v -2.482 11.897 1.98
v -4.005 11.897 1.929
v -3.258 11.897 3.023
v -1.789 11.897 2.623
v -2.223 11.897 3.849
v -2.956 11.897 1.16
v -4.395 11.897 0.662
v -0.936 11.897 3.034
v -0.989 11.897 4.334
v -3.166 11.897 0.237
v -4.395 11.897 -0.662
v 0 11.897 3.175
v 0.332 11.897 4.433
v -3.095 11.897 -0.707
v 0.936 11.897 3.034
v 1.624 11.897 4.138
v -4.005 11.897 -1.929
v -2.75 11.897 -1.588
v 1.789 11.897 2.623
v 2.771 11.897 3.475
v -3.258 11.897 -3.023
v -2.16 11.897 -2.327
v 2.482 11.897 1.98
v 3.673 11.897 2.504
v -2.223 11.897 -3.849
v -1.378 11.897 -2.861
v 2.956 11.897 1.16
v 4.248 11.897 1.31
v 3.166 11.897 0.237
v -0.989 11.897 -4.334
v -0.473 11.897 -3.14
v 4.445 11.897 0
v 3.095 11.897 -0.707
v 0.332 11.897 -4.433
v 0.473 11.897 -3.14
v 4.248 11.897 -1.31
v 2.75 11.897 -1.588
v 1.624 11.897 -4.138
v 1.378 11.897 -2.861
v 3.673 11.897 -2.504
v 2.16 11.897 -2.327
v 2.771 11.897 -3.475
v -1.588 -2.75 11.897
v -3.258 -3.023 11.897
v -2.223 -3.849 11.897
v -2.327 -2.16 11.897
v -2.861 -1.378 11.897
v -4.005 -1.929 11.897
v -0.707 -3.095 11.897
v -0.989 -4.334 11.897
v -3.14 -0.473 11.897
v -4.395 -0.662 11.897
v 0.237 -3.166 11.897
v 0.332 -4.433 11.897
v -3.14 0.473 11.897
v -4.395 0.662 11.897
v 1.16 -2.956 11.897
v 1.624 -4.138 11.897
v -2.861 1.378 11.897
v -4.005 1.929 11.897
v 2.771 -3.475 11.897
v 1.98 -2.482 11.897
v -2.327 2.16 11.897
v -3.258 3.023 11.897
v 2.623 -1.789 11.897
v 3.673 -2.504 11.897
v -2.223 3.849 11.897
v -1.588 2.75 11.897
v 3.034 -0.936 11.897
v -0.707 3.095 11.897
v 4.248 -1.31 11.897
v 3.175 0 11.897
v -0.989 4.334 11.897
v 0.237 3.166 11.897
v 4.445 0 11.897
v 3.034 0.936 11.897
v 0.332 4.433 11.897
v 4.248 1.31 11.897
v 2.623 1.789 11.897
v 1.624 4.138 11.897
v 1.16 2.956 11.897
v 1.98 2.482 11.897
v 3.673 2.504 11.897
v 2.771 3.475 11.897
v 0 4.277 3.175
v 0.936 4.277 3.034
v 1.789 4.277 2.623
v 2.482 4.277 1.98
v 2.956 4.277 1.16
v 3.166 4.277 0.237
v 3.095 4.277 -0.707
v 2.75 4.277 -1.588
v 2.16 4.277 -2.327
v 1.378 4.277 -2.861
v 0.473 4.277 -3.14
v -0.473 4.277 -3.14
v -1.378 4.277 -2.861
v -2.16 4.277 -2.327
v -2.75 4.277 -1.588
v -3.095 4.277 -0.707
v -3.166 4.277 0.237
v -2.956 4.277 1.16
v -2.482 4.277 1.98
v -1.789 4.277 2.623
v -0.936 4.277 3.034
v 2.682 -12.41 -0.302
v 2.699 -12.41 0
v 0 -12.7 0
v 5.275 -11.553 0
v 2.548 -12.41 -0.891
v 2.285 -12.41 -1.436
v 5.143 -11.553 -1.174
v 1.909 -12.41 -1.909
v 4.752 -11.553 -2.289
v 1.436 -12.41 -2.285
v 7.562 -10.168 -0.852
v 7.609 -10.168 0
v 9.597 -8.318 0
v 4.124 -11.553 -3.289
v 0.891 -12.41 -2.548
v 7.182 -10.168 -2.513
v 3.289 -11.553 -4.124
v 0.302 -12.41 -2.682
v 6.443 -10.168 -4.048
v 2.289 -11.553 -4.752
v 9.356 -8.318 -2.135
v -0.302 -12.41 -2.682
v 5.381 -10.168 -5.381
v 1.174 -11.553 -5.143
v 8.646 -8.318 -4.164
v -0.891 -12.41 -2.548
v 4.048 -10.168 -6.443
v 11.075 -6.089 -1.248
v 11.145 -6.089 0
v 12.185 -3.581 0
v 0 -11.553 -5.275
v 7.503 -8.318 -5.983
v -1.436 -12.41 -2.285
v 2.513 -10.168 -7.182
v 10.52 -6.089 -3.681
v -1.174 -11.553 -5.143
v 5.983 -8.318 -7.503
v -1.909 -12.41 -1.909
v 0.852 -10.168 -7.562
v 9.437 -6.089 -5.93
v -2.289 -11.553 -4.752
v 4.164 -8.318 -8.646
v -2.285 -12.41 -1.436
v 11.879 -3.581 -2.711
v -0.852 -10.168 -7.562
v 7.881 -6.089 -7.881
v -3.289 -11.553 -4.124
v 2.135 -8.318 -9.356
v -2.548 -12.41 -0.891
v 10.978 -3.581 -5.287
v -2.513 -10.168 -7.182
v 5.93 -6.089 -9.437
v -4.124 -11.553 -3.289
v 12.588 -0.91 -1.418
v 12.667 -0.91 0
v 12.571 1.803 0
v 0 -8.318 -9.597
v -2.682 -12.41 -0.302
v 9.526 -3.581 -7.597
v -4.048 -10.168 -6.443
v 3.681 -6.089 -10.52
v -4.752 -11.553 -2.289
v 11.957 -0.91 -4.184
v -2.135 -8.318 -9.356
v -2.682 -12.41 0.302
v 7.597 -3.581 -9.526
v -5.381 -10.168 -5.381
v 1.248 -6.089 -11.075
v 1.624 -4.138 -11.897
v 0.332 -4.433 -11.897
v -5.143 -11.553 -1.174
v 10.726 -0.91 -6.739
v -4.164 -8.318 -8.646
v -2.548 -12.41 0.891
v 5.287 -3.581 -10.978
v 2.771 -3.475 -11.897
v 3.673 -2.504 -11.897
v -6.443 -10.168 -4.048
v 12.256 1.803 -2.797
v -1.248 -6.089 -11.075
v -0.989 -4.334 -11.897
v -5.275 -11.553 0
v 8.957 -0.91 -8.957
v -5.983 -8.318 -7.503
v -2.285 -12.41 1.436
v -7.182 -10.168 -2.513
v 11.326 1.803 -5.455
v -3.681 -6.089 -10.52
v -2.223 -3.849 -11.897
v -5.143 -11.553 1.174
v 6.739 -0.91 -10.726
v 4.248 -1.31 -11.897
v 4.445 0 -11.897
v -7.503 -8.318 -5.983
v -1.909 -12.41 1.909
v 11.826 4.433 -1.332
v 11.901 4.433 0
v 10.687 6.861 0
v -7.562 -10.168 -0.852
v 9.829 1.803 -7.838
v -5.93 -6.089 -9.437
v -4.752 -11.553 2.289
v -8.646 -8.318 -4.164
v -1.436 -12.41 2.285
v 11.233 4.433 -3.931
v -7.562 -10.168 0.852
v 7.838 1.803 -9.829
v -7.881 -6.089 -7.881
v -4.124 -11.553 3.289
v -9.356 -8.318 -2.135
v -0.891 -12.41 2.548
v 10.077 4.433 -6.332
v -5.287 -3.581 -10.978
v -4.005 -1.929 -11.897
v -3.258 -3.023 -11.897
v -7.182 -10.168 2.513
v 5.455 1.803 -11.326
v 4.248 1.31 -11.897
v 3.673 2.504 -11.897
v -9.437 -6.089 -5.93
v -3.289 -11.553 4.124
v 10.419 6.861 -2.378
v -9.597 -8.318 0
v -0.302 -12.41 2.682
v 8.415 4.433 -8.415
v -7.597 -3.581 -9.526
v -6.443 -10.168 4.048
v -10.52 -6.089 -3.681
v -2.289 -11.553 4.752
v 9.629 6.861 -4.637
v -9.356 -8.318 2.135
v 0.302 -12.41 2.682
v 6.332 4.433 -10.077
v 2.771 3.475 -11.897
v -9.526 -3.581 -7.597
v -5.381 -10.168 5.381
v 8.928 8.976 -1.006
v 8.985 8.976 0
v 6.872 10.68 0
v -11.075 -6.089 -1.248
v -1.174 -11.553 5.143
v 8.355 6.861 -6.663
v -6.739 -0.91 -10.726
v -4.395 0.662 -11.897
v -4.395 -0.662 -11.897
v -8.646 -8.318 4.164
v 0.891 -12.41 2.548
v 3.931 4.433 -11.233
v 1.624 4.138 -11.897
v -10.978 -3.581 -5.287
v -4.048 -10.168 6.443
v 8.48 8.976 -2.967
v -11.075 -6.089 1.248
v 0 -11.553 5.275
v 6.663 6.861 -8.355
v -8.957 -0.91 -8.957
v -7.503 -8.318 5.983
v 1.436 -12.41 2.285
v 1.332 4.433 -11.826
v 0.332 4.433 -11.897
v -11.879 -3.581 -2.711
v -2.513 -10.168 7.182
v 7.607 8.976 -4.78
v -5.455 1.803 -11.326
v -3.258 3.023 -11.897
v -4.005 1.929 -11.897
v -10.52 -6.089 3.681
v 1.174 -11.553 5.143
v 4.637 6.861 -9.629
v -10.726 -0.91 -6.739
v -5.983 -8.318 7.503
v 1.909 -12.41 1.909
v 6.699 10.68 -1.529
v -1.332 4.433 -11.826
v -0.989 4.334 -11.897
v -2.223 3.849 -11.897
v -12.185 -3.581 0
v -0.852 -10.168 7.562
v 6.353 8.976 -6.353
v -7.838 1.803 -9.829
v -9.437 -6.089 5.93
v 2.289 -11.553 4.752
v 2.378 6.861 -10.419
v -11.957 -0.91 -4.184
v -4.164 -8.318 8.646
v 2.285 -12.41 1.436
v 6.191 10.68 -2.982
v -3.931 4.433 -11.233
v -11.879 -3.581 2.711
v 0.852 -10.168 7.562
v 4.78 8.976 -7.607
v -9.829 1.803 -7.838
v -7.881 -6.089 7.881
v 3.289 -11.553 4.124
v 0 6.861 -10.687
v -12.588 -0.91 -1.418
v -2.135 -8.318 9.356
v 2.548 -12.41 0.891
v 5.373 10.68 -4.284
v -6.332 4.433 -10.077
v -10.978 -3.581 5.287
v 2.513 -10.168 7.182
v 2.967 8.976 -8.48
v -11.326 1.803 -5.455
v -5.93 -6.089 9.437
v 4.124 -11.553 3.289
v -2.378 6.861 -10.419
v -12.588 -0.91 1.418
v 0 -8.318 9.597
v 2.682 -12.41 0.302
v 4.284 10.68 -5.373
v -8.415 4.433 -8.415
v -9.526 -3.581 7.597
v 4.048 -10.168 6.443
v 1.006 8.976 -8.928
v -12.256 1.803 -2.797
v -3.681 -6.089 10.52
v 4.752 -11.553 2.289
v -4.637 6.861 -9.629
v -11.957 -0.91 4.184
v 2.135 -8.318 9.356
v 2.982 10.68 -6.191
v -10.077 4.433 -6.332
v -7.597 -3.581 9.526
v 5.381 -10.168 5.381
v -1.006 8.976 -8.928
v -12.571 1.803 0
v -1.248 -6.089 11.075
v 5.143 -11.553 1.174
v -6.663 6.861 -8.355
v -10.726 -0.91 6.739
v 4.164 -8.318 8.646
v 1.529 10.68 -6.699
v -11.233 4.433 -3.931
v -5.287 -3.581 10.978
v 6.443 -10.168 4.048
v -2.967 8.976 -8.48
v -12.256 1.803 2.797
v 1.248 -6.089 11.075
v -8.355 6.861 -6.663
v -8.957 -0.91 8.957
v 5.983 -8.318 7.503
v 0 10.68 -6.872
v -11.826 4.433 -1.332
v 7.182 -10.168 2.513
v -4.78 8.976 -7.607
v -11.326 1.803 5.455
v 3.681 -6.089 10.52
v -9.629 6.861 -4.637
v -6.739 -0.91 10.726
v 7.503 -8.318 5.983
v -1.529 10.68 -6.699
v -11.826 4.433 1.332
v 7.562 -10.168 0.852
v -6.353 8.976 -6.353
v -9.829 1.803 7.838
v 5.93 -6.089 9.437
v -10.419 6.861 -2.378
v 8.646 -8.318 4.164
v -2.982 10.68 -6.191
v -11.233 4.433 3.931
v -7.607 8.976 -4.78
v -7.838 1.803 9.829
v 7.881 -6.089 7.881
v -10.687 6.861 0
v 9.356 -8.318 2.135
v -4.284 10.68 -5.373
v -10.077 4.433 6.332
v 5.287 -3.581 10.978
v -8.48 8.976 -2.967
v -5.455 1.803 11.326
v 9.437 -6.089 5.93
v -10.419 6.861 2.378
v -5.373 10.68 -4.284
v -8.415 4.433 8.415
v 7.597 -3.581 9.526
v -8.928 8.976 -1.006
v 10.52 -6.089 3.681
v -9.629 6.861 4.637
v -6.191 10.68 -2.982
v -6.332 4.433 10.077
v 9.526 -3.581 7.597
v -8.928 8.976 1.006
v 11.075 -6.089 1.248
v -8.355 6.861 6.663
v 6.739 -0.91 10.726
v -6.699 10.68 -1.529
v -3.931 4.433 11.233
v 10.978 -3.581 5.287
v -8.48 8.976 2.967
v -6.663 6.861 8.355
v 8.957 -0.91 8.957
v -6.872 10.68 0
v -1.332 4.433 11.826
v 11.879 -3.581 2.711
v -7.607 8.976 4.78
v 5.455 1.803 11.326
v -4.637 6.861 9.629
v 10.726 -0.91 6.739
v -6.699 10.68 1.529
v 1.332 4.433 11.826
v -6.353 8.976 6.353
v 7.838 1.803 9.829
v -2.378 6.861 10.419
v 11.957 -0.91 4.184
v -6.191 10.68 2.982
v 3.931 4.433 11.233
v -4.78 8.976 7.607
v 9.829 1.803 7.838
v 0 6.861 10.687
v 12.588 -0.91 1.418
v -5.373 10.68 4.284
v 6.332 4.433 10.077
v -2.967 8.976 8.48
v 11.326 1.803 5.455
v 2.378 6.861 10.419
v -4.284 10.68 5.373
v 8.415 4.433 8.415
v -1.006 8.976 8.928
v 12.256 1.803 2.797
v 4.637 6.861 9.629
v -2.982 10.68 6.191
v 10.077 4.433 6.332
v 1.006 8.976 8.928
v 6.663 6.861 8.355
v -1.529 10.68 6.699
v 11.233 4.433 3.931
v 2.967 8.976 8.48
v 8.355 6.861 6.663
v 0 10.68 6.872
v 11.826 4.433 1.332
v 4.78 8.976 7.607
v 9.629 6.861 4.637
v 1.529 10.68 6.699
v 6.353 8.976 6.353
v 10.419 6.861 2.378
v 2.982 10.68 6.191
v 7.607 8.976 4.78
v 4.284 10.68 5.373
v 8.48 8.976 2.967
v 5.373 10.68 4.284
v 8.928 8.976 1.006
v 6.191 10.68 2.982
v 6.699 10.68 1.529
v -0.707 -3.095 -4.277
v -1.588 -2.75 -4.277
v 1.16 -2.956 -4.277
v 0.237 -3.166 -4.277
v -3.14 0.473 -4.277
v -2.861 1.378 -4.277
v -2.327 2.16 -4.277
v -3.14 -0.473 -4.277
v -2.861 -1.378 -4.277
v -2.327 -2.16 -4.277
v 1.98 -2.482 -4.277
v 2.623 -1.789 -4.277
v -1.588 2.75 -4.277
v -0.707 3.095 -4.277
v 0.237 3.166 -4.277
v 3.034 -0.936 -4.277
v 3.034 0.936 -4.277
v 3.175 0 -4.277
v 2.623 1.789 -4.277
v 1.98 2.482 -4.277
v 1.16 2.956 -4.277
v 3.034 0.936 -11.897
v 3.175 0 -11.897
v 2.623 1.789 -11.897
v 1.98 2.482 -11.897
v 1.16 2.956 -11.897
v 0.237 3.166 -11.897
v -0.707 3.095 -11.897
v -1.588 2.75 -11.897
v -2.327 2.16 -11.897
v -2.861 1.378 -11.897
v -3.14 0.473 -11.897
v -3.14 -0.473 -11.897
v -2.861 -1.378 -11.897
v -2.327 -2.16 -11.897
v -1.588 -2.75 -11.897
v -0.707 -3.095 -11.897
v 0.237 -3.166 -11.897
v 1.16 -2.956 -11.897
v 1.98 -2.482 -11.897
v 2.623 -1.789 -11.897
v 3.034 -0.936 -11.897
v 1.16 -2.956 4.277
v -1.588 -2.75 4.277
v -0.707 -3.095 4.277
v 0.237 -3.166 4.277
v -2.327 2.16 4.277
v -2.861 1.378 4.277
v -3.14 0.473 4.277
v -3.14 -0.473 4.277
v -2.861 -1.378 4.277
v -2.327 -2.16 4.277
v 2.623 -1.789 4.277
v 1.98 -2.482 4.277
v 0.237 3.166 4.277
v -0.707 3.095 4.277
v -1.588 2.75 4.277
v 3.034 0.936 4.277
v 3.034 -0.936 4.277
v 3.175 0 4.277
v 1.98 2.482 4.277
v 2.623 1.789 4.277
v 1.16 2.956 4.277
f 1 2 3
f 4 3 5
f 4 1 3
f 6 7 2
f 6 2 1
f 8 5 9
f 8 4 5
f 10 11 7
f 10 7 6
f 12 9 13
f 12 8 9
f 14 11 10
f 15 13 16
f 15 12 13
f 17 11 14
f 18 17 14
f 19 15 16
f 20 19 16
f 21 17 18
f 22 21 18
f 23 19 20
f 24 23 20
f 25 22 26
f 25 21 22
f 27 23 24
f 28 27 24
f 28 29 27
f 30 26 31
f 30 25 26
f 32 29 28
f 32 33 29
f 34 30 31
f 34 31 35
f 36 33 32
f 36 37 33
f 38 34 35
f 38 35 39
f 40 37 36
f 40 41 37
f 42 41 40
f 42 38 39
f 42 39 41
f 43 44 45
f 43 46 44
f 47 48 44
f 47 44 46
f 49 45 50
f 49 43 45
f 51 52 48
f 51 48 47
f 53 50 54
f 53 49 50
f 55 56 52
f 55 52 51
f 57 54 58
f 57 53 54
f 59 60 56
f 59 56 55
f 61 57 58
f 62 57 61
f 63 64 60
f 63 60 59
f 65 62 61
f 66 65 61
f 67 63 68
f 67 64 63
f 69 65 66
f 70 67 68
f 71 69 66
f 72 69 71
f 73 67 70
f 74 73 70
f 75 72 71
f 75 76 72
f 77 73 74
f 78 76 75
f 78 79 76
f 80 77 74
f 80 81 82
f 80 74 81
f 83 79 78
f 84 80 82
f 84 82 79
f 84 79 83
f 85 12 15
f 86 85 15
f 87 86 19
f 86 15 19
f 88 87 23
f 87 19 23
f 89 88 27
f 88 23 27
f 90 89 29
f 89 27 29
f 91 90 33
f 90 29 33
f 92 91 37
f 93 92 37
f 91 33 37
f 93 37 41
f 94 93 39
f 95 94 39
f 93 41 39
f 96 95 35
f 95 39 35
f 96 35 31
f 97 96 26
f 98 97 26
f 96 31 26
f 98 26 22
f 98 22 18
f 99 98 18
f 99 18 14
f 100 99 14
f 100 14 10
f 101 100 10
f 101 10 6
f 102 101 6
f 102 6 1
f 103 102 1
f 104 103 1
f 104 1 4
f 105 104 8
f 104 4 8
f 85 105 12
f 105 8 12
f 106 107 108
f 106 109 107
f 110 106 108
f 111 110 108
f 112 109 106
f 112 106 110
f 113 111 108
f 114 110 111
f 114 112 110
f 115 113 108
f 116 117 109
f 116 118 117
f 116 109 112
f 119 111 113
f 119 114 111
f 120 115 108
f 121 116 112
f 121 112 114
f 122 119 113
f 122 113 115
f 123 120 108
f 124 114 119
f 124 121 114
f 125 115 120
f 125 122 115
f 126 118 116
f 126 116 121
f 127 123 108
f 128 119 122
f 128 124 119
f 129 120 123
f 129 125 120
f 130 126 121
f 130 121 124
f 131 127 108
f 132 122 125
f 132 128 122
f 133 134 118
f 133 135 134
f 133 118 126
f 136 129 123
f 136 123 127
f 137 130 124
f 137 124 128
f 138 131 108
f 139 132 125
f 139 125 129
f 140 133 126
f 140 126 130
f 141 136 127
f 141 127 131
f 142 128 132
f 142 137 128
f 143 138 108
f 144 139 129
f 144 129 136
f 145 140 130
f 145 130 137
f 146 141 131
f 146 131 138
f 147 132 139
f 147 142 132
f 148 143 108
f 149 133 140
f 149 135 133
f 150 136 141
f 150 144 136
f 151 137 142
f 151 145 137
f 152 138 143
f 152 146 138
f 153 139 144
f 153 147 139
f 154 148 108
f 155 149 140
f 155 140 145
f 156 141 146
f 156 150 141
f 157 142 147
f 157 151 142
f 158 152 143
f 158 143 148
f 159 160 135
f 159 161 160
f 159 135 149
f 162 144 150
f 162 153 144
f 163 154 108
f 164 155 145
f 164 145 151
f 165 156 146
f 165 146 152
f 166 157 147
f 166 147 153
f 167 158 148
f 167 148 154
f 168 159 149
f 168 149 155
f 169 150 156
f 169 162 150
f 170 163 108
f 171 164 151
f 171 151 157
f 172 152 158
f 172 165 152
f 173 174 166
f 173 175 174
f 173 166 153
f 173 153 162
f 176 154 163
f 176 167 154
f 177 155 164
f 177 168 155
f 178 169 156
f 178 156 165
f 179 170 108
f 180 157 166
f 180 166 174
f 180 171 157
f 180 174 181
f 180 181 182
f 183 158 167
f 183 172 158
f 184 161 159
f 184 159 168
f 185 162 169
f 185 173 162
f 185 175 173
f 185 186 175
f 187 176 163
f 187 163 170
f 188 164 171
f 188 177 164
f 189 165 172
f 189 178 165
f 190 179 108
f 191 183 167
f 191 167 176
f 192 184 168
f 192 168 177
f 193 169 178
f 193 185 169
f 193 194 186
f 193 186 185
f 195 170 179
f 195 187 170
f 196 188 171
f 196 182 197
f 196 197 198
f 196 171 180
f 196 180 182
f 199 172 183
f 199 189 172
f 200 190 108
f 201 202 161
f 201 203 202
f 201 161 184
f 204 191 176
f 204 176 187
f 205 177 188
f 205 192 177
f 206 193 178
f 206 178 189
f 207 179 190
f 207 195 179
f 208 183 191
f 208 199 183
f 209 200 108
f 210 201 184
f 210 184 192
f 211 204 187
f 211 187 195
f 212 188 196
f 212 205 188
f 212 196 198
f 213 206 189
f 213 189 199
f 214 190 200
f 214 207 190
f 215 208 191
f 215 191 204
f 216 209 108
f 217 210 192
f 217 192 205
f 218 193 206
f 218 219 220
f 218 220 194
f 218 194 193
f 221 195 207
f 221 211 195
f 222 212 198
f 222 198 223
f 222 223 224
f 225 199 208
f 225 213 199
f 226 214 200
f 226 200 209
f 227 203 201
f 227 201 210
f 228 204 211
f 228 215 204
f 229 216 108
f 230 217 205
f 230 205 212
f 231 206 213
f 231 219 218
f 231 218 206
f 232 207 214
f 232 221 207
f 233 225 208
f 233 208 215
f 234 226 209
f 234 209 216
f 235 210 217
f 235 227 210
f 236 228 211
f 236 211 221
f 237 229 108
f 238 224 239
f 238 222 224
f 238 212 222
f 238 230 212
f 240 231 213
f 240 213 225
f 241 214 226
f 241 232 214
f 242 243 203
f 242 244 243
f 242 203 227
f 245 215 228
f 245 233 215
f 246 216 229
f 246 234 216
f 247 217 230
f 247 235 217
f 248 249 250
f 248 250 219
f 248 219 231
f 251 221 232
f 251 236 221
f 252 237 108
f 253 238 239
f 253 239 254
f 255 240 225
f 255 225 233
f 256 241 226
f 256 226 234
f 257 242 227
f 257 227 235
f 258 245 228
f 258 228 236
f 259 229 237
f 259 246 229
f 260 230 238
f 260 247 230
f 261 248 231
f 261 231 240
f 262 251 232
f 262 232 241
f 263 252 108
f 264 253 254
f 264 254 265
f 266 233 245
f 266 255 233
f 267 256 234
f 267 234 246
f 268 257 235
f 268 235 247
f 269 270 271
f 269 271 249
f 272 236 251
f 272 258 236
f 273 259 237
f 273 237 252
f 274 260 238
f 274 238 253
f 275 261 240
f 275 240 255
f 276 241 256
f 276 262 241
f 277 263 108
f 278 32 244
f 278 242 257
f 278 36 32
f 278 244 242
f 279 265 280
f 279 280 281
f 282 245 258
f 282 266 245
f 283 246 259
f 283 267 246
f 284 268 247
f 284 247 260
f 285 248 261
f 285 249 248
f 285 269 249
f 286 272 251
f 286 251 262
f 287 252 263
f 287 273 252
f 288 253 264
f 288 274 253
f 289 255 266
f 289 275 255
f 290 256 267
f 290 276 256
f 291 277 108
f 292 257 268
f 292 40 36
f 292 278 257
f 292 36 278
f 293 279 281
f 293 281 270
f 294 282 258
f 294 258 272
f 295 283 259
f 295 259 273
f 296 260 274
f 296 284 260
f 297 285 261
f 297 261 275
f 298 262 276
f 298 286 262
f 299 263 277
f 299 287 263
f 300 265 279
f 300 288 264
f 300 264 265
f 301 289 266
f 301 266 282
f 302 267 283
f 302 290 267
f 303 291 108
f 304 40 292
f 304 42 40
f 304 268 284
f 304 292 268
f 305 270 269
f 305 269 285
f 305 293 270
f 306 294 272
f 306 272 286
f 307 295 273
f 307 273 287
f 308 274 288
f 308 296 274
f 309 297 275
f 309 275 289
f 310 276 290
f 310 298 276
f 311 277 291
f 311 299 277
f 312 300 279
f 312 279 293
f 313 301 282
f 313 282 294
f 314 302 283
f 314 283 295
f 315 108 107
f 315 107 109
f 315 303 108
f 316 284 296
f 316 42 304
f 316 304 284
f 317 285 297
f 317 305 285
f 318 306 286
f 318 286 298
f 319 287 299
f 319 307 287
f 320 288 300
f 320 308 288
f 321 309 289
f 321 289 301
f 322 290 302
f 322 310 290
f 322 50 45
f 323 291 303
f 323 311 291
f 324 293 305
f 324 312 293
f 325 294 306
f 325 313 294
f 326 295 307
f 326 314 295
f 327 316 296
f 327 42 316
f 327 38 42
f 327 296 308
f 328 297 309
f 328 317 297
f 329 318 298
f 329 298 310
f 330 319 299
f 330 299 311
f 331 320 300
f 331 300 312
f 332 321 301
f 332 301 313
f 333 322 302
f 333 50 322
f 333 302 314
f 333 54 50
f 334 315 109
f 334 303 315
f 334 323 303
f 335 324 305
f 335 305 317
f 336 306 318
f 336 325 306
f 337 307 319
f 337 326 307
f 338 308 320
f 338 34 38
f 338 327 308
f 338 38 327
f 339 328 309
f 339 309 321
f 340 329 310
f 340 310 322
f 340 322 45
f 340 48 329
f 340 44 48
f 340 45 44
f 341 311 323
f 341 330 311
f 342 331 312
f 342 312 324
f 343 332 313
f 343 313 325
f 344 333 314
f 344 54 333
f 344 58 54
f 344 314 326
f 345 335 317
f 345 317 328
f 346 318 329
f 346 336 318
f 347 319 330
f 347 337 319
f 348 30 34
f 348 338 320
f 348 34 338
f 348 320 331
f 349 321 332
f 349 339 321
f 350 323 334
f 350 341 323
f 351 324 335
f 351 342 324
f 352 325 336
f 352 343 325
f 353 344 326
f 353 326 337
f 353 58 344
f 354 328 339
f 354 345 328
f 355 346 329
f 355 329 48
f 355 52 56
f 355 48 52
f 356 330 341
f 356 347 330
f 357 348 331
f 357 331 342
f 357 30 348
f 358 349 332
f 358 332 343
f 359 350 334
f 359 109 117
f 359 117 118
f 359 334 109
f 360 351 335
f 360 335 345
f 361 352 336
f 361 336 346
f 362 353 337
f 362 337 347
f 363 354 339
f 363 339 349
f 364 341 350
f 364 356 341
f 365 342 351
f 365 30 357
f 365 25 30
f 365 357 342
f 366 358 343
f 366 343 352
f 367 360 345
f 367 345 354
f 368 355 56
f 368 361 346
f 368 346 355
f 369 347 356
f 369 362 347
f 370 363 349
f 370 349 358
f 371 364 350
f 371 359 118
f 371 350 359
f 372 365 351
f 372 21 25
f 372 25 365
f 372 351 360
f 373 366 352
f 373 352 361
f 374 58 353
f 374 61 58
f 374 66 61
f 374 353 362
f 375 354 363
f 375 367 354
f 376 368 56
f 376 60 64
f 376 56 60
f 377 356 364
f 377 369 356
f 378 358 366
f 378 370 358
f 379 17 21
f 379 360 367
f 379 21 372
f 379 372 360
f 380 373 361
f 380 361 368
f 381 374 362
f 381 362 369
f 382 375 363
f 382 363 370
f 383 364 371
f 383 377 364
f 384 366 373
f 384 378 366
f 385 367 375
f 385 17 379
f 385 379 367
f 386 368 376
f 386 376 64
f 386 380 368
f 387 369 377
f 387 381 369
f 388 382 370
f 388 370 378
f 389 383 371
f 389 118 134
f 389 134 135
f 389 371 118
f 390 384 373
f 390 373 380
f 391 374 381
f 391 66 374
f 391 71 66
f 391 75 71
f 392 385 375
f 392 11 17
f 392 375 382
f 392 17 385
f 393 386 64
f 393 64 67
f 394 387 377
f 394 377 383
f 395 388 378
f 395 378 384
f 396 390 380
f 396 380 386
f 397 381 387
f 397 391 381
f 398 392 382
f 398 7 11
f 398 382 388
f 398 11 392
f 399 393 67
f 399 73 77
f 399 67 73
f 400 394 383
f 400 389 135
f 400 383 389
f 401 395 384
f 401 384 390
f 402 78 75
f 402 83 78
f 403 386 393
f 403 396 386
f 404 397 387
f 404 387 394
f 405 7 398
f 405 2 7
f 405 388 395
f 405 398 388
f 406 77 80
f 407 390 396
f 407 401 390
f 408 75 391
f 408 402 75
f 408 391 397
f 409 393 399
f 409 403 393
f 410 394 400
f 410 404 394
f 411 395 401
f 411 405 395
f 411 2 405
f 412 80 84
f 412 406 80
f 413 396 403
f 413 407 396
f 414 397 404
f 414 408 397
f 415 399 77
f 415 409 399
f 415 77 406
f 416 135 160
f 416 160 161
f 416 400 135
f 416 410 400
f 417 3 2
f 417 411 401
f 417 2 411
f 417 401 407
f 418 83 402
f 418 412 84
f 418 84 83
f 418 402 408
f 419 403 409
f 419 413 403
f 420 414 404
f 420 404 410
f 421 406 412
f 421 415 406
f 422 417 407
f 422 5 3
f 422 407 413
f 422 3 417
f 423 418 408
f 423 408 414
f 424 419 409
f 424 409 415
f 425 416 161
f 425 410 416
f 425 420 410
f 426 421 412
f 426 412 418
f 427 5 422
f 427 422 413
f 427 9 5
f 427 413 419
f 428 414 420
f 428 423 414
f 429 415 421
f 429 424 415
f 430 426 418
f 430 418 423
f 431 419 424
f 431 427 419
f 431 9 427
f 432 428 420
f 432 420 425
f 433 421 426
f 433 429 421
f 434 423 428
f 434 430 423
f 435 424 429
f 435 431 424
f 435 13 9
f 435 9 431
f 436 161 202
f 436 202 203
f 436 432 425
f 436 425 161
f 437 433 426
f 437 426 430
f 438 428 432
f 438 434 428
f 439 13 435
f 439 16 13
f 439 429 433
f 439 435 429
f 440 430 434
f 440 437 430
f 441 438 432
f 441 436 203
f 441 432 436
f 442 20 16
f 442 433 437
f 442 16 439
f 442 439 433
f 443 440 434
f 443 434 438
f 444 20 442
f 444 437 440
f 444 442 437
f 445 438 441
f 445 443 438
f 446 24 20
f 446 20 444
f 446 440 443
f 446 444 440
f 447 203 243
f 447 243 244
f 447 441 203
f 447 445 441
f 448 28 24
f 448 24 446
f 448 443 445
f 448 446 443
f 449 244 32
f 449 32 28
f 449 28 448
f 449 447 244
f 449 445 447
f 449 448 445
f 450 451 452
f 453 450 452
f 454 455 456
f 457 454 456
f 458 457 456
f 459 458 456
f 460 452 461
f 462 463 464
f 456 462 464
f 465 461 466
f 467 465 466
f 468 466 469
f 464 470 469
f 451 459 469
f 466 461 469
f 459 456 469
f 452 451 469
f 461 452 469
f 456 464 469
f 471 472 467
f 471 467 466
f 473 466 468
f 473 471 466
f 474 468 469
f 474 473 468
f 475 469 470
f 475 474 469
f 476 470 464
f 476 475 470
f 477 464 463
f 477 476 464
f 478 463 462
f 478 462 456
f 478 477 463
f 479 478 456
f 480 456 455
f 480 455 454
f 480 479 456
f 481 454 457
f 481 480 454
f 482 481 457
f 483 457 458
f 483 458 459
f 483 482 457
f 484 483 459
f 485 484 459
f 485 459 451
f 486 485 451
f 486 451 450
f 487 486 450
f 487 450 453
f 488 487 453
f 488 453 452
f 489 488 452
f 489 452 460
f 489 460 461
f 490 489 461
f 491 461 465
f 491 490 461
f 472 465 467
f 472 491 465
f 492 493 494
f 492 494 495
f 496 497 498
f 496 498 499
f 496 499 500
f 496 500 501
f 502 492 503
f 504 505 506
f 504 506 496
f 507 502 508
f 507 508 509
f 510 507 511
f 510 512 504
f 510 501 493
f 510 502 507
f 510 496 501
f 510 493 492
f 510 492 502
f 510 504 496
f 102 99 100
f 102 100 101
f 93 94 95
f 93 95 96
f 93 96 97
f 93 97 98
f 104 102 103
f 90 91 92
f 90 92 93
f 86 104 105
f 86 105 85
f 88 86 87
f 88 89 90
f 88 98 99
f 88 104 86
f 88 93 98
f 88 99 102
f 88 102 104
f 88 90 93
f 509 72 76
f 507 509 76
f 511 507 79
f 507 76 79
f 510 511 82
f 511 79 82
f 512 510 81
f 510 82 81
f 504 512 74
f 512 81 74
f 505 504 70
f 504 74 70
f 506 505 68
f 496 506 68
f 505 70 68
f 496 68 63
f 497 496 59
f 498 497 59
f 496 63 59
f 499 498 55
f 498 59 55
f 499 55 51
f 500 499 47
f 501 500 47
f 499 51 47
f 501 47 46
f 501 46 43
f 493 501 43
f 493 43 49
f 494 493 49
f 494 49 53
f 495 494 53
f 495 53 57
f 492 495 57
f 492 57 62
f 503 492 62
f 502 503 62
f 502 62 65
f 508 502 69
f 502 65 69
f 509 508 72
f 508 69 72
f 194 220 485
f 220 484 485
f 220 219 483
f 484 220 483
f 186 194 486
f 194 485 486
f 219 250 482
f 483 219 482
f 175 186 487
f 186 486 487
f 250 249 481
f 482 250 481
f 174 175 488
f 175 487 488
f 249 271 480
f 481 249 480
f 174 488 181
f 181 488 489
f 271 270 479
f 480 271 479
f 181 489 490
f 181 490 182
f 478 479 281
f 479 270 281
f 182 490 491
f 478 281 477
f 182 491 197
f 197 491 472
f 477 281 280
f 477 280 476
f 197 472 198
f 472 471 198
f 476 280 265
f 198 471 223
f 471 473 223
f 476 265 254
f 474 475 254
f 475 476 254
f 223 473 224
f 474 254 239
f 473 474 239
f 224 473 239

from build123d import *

# Parameters (mm, degrees)
CUT_EXTRUDE1_START = 11.896721
SKETCH3_R          = 4.445
CUT_EXTRUDE1_DEPTH = 2.54
SKETCH4_R          = 3.175
CUT_EXTRUDE2_DEPTH = 7.62
CUT_EXTRUDE3_START = 11.896721
SKETCH5_R          = 4.445
CUT_EXTRUDE3_DEPTH = 7.62
SKETCH6_R          = 3.175
CUT_EXTRUDE4_DEPTH = 7.62


with BuildPart() as part:
    # Sketch2 → Revolve2 (revolve)
    with BuildSketch(Plane.XY):
        with BuildLine():
            Line((0, 12.7), (0, -12.7))
            ThreePointArc((0, -12.7), (12.7, 0), (0, 12.7))
        make_face()
    revolve(axis=Axis((0, 0, 0), (0, 1, 0)))

    # Sketch3 → Cut-Extrude1 (cut)
    with BuildSketch(Plane.XY.offset(CUT_EXTRUDE1_START)):
        Circle(SKETCH3_R)
    cut_extrude1 = extrude(amount=CUT_EXTRUDE1_DEPTH, mode=Mode.SUBTRACT)

    # Sketch4 → Cut-Extrude2 (cut)
    with BuildSketch(Plane.XY.offset(11.896721187)):
        Circle(SKETCH4_R)
    cut_extrude2 = extrude(amount=-CUT_EXTRUDE2_DEPTH, mode=Mode.SUBTRACT)

    # Mirror1: Cut-Extrude1, Cut-Extrude2 across plane
    add(cut_extrude1.mirror(Plane.XY), mode=Mode.SUBTRACT)
    add(cut_extrude2.mirror(Plane.XY), mode=Mode.SUBTRACT)

    # Sketch5 → Cut-Extrude3 (cut)
    with BuildSketch(Plane(origin=(0, 0, 0), x_dir=(1, 0, 0), z_dir=(0, 1, 0)).offset(CUT_EXTRUDE3_START)):
        Circle(SKETCH5_R)
    extrude(amount=CUT_EXTRUDE3_DEPTH, mode=Mode.SUBTRACT)

    # Sketch6 → Cut-Extrude4 (cut)
    with BuildSketch(Plane(origin=(0, 11.896721187, 0), x_dir=(1, 0, 0), z_dir=(0, 1, 0))):
        with Locations(Location((0, 0, 0), (0, 0, 270))):
            Circle(SKETCH6_R)
    extrude(amount=-CUT_EXTRUDE4_DEPTH, mode=Mode.SUBTRACT)


solid = part.part
